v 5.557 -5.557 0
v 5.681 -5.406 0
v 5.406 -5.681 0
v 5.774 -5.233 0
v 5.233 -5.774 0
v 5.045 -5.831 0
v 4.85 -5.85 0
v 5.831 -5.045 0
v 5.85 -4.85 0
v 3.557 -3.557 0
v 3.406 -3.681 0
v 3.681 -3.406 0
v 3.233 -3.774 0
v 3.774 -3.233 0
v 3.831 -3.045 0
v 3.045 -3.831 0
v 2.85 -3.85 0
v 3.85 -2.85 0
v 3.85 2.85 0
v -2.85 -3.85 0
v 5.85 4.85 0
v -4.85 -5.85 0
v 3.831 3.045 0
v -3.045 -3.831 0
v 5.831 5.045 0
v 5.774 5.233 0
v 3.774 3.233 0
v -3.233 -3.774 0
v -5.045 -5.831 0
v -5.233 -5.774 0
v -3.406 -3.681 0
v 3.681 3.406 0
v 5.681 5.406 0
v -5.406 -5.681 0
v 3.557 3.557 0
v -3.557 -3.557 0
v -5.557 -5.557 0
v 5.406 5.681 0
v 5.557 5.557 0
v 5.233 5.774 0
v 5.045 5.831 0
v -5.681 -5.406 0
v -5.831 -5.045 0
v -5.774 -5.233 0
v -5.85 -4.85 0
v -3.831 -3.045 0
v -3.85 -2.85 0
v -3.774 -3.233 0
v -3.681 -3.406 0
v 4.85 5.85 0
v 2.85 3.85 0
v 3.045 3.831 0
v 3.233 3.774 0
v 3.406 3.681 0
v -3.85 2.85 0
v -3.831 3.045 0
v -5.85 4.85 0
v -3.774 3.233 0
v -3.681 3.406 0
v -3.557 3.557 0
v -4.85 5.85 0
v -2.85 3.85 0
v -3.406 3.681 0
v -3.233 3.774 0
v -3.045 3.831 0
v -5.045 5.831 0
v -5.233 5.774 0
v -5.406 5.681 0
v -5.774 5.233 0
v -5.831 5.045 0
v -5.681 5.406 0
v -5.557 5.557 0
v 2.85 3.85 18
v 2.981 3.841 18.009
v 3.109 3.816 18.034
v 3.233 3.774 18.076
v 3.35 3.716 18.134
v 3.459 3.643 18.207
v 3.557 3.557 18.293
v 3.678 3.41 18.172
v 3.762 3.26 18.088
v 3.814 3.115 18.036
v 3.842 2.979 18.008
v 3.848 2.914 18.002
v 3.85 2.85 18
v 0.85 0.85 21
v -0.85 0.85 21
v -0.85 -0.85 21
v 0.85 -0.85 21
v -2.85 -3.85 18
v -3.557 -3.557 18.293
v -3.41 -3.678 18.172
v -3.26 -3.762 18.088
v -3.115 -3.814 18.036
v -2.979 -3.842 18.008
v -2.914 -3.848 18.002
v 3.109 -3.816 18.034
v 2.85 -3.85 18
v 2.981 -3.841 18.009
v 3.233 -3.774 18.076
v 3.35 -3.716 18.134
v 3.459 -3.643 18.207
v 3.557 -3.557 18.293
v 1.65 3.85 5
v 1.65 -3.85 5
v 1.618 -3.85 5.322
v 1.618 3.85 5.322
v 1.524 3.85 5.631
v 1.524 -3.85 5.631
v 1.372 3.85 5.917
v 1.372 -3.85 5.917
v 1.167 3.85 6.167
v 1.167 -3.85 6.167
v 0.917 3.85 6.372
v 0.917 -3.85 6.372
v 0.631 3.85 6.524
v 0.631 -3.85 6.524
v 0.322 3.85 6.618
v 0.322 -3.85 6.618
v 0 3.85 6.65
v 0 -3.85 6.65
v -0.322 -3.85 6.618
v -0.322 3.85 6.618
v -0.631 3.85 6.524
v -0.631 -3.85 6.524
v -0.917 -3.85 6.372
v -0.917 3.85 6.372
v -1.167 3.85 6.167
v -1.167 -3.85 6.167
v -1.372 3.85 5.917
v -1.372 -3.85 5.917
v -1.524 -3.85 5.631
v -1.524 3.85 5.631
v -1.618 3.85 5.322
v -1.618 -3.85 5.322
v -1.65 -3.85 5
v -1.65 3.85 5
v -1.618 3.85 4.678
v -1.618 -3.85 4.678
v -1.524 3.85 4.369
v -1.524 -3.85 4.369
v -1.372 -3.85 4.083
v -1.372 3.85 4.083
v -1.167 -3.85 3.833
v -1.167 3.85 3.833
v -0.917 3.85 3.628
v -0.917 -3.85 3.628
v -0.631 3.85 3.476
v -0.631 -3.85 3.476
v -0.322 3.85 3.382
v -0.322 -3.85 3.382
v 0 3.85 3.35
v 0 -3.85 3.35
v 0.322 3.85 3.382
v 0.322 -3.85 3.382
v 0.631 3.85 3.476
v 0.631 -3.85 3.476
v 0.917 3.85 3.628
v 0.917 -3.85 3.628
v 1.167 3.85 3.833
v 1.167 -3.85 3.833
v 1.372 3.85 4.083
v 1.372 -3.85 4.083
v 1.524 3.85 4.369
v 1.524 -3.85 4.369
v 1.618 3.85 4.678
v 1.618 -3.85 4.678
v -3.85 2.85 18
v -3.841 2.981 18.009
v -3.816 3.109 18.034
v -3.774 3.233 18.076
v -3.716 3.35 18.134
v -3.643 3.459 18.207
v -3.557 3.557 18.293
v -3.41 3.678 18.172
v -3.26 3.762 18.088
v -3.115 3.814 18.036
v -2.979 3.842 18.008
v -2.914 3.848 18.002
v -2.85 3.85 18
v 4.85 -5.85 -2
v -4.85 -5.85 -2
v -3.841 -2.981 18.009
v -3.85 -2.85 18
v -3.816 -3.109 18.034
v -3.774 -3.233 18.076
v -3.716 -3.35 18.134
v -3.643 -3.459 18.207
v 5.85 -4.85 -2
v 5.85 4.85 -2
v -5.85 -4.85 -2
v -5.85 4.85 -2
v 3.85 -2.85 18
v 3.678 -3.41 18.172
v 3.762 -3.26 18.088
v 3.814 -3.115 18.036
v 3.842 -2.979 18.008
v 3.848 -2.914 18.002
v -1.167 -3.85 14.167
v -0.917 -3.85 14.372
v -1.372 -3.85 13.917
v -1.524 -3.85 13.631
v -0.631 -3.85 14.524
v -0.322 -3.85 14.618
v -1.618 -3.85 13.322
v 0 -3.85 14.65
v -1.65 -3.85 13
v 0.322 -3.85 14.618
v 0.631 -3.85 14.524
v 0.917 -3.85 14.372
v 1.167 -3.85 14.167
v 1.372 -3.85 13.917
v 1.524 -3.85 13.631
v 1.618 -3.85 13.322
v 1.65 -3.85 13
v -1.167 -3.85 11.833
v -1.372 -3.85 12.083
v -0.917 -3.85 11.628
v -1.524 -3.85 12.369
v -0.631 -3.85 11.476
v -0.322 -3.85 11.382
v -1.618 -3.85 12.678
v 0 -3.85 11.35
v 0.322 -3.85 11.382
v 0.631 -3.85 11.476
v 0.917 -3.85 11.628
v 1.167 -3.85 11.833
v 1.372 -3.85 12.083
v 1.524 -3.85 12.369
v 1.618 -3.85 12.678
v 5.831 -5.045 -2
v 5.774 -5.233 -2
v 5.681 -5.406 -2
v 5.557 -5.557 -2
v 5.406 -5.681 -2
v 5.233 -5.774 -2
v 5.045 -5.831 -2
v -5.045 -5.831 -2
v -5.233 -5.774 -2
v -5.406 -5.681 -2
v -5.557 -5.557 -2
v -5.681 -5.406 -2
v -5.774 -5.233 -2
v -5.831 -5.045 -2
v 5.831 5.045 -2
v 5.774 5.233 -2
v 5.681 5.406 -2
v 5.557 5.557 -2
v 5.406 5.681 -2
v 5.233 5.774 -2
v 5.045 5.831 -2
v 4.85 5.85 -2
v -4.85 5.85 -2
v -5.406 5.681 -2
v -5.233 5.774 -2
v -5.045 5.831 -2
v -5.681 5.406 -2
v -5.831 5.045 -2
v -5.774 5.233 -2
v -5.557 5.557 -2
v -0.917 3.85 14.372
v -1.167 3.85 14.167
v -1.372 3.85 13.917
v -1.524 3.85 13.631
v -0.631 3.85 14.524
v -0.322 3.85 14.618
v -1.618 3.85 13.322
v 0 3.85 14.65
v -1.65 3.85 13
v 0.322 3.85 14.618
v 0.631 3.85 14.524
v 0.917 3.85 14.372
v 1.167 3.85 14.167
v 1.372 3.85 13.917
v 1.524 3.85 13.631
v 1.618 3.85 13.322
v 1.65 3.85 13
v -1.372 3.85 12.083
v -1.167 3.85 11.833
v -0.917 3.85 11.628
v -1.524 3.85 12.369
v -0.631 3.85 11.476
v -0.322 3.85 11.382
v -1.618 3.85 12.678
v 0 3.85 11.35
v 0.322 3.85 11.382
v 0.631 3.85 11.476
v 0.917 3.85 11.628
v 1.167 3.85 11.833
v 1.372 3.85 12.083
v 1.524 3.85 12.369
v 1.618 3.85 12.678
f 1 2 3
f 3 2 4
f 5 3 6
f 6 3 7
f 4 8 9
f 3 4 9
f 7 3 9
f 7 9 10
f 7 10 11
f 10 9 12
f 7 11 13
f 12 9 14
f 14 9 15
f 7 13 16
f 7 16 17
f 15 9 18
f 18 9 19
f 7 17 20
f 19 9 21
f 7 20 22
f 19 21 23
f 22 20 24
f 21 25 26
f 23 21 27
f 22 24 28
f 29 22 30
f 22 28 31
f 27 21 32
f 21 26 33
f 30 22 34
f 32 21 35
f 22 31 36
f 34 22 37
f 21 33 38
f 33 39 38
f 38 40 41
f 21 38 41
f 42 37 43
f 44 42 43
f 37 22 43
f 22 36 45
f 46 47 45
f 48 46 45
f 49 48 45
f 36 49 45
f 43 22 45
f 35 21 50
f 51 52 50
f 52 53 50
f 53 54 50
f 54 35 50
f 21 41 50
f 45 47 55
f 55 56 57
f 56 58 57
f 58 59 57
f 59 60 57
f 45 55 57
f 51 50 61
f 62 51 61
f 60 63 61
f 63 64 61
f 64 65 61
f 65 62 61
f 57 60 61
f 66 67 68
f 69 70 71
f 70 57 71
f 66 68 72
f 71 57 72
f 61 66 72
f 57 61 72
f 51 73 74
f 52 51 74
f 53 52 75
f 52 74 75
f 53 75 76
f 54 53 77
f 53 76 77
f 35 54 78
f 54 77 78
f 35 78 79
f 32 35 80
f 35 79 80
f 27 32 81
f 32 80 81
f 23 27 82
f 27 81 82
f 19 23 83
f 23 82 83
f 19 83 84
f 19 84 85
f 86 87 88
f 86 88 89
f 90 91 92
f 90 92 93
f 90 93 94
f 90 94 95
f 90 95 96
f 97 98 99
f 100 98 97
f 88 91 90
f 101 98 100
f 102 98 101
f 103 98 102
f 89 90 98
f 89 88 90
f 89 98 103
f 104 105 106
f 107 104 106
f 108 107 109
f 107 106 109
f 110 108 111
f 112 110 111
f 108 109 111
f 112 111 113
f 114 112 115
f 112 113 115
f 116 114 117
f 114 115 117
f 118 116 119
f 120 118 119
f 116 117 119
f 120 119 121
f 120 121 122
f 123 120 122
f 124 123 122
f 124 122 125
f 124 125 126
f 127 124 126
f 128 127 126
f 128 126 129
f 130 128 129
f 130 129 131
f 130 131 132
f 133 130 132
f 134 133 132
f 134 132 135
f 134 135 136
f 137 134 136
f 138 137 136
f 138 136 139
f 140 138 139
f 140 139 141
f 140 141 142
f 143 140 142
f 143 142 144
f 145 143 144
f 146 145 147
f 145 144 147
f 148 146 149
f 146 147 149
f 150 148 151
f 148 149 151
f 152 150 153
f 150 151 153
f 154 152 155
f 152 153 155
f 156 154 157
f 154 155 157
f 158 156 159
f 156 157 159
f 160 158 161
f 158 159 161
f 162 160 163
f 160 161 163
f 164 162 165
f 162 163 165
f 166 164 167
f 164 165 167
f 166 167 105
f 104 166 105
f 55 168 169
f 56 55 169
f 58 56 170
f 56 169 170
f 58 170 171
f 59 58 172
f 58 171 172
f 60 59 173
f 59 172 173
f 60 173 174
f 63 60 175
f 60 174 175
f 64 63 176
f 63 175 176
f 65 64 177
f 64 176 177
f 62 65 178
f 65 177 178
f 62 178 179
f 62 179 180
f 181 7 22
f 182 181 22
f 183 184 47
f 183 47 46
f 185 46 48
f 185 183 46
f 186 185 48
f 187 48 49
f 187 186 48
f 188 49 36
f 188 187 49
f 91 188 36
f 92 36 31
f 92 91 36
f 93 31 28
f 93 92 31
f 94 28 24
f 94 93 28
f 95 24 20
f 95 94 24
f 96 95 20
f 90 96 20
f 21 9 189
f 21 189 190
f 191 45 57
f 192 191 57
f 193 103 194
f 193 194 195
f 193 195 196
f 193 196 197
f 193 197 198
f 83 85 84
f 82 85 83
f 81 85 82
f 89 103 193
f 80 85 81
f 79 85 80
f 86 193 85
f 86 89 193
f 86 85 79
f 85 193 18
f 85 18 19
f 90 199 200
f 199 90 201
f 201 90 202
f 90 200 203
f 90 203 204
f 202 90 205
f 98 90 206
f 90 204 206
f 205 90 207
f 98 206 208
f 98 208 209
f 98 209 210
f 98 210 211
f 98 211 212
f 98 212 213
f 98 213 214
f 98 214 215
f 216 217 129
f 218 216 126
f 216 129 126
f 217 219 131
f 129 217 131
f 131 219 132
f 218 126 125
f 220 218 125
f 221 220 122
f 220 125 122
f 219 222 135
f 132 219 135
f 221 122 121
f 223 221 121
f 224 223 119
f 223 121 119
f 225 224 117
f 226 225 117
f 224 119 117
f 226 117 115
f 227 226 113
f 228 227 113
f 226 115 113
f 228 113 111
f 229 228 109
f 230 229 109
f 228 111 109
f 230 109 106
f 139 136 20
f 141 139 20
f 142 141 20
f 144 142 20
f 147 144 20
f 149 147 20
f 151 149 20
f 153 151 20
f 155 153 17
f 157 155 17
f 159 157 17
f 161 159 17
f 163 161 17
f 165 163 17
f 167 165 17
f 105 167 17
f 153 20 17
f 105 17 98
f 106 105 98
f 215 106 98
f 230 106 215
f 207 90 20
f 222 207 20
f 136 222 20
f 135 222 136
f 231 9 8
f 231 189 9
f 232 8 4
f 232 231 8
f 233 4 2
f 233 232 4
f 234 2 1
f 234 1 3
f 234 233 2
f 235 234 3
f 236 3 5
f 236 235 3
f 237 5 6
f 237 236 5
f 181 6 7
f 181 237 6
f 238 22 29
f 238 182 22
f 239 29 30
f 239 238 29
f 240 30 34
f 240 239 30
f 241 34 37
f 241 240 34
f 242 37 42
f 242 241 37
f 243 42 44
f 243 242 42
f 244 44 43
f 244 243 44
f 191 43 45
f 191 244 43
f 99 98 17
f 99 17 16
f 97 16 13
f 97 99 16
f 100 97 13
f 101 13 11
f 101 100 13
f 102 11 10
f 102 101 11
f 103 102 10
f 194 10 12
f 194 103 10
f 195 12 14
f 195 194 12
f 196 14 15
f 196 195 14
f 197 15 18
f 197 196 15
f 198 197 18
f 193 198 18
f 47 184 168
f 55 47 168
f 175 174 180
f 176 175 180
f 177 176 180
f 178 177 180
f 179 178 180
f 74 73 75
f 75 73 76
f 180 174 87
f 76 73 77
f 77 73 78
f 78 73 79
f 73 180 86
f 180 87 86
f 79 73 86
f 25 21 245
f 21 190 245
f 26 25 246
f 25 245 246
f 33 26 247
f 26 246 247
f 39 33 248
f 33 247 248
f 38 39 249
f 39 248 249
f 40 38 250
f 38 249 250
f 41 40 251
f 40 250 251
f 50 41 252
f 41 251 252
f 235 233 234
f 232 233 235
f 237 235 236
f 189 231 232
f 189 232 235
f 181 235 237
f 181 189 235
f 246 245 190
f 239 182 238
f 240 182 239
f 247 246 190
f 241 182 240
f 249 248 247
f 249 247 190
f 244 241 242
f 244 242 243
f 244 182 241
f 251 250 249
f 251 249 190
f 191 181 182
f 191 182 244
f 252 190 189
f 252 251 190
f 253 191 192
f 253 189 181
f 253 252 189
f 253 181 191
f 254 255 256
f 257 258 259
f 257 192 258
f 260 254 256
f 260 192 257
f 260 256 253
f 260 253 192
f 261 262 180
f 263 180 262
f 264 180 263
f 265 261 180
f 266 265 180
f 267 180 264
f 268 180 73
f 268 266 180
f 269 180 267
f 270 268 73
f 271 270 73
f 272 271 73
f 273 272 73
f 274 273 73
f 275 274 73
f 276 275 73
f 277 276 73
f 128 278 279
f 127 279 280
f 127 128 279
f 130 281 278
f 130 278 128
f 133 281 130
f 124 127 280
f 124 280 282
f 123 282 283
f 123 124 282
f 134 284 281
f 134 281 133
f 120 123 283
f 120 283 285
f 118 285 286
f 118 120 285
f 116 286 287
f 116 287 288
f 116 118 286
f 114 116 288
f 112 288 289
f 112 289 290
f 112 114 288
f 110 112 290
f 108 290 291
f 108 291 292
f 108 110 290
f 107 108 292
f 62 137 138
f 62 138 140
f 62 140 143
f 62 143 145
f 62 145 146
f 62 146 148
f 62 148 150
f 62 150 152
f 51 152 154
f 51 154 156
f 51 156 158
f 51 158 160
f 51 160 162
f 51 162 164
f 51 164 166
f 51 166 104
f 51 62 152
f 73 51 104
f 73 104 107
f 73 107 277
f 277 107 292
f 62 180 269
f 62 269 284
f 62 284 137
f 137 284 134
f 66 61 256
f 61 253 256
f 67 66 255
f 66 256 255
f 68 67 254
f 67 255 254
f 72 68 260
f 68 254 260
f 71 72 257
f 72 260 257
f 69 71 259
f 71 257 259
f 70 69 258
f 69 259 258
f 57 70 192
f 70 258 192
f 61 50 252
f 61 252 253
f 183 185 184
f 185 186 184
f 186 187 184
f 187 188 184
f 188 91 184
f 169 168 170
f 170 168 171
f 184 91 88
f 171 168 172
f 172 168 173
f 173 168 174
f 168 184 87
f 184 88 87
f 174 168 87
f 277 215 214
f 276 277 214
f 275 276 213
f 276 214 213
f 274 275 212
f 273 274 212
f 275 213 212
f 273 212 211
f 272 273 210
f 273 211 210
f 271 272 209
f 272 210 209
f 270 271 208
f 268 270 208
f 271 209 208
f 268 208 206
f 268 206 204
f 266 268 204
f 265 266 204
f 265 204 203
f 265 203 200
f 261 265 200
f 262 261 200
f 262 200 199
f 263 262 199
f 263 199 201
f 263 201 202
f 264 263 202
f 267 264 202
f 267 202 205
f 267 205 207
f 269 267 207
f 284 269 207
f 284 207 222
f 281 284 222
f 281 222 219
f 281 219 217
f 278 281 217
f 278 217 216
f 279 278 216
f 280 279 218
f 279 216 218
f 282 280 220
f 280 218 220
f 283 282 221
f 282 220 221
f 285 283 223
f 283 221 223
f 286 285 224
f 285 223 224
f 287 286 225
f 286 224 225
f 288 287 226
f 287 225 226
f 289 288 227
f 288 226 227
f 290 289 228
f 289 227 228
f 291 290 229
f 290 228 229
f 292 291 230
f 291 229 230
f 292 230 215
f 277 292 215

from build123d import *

# Parameters (mm, degrees)
SKETCH_1_W          = 7.7
SKETCH_1_H          = 7.7
EXTRUDE_1_DEPTH     = 21
SKETCH_2_W          = 11.7
SKETCH_2_H          = 11.7
EXTRUDE_2_DEPTH     = 2
CHAMFER_1_SIZE      = 3
FILLET_2_R          = 1
SKETCH_5_R          = 1.65
CUT_EXTRUDE_2_DEPTH = 24


with BuildPart() as part:
    # 草图1 → 凸台-拉伸1 (new body)
    with BuildSketch(Plane.XY):
        Rectangle(SKETCH_1_W, SKETCH_1_H)
    extrude(amount=EXTRUDE_1_DEPTH)

    # 草图2 → 凸台-拉伸2 (add)
    with BuildSketch(Plane(origin=(0, 0, 0), x_dir=(-1, 0, 0), z_dir=(0, 0, -1))):
        Rectangle(SKETCH_2_W, SKETCH_2_H)
    extrude(amount=EXTRUDE_2_DEPTH)

    # 倒角1
    chamfer_1_edges = [part.edges().sort_by_distance(p)[0] for p in [
        (-3.85, 0, 21),
        (0, -3.85, 21),
        (3.85, 0, 21),
        (0, 3.85, 21),
    ]]
    chamfer(chamfer_1_edges, length=CHAMFER_1_SIZE)

    # 圆角2
    fillet_2_edges = [part.edges().sort_by_distance(p)[0] for p in [
        (-5.85, -5.85, -1),
        (-5.85, 5.85, -1),
        (5.85, 5.85, -1),
        (5.85, -5.85, -1),
        (-3.85, -3.85, 9),
        (-3.85, 3.85, 9),
        (3.85, -3.85, 9),
        (3.85, 3.85, 9),
    ]]
    fillet(fillet_2_edges, radius=FILLET_2_R)

    # 草图5 → 切除-拉伸2 (cut)
    with BuildSketch(Plane.XZ.offset(3.85)):
        with Locations((0, 5)):
            Circle(SKETCH_5_R)
        with Locations((0, 13)):
            Circle(SKETCH_5_R)
    extrude(amount=-CUT_EXTRUDE_2_DEPTH, mode=Mode.SUBTRACT)


solid = part.part
